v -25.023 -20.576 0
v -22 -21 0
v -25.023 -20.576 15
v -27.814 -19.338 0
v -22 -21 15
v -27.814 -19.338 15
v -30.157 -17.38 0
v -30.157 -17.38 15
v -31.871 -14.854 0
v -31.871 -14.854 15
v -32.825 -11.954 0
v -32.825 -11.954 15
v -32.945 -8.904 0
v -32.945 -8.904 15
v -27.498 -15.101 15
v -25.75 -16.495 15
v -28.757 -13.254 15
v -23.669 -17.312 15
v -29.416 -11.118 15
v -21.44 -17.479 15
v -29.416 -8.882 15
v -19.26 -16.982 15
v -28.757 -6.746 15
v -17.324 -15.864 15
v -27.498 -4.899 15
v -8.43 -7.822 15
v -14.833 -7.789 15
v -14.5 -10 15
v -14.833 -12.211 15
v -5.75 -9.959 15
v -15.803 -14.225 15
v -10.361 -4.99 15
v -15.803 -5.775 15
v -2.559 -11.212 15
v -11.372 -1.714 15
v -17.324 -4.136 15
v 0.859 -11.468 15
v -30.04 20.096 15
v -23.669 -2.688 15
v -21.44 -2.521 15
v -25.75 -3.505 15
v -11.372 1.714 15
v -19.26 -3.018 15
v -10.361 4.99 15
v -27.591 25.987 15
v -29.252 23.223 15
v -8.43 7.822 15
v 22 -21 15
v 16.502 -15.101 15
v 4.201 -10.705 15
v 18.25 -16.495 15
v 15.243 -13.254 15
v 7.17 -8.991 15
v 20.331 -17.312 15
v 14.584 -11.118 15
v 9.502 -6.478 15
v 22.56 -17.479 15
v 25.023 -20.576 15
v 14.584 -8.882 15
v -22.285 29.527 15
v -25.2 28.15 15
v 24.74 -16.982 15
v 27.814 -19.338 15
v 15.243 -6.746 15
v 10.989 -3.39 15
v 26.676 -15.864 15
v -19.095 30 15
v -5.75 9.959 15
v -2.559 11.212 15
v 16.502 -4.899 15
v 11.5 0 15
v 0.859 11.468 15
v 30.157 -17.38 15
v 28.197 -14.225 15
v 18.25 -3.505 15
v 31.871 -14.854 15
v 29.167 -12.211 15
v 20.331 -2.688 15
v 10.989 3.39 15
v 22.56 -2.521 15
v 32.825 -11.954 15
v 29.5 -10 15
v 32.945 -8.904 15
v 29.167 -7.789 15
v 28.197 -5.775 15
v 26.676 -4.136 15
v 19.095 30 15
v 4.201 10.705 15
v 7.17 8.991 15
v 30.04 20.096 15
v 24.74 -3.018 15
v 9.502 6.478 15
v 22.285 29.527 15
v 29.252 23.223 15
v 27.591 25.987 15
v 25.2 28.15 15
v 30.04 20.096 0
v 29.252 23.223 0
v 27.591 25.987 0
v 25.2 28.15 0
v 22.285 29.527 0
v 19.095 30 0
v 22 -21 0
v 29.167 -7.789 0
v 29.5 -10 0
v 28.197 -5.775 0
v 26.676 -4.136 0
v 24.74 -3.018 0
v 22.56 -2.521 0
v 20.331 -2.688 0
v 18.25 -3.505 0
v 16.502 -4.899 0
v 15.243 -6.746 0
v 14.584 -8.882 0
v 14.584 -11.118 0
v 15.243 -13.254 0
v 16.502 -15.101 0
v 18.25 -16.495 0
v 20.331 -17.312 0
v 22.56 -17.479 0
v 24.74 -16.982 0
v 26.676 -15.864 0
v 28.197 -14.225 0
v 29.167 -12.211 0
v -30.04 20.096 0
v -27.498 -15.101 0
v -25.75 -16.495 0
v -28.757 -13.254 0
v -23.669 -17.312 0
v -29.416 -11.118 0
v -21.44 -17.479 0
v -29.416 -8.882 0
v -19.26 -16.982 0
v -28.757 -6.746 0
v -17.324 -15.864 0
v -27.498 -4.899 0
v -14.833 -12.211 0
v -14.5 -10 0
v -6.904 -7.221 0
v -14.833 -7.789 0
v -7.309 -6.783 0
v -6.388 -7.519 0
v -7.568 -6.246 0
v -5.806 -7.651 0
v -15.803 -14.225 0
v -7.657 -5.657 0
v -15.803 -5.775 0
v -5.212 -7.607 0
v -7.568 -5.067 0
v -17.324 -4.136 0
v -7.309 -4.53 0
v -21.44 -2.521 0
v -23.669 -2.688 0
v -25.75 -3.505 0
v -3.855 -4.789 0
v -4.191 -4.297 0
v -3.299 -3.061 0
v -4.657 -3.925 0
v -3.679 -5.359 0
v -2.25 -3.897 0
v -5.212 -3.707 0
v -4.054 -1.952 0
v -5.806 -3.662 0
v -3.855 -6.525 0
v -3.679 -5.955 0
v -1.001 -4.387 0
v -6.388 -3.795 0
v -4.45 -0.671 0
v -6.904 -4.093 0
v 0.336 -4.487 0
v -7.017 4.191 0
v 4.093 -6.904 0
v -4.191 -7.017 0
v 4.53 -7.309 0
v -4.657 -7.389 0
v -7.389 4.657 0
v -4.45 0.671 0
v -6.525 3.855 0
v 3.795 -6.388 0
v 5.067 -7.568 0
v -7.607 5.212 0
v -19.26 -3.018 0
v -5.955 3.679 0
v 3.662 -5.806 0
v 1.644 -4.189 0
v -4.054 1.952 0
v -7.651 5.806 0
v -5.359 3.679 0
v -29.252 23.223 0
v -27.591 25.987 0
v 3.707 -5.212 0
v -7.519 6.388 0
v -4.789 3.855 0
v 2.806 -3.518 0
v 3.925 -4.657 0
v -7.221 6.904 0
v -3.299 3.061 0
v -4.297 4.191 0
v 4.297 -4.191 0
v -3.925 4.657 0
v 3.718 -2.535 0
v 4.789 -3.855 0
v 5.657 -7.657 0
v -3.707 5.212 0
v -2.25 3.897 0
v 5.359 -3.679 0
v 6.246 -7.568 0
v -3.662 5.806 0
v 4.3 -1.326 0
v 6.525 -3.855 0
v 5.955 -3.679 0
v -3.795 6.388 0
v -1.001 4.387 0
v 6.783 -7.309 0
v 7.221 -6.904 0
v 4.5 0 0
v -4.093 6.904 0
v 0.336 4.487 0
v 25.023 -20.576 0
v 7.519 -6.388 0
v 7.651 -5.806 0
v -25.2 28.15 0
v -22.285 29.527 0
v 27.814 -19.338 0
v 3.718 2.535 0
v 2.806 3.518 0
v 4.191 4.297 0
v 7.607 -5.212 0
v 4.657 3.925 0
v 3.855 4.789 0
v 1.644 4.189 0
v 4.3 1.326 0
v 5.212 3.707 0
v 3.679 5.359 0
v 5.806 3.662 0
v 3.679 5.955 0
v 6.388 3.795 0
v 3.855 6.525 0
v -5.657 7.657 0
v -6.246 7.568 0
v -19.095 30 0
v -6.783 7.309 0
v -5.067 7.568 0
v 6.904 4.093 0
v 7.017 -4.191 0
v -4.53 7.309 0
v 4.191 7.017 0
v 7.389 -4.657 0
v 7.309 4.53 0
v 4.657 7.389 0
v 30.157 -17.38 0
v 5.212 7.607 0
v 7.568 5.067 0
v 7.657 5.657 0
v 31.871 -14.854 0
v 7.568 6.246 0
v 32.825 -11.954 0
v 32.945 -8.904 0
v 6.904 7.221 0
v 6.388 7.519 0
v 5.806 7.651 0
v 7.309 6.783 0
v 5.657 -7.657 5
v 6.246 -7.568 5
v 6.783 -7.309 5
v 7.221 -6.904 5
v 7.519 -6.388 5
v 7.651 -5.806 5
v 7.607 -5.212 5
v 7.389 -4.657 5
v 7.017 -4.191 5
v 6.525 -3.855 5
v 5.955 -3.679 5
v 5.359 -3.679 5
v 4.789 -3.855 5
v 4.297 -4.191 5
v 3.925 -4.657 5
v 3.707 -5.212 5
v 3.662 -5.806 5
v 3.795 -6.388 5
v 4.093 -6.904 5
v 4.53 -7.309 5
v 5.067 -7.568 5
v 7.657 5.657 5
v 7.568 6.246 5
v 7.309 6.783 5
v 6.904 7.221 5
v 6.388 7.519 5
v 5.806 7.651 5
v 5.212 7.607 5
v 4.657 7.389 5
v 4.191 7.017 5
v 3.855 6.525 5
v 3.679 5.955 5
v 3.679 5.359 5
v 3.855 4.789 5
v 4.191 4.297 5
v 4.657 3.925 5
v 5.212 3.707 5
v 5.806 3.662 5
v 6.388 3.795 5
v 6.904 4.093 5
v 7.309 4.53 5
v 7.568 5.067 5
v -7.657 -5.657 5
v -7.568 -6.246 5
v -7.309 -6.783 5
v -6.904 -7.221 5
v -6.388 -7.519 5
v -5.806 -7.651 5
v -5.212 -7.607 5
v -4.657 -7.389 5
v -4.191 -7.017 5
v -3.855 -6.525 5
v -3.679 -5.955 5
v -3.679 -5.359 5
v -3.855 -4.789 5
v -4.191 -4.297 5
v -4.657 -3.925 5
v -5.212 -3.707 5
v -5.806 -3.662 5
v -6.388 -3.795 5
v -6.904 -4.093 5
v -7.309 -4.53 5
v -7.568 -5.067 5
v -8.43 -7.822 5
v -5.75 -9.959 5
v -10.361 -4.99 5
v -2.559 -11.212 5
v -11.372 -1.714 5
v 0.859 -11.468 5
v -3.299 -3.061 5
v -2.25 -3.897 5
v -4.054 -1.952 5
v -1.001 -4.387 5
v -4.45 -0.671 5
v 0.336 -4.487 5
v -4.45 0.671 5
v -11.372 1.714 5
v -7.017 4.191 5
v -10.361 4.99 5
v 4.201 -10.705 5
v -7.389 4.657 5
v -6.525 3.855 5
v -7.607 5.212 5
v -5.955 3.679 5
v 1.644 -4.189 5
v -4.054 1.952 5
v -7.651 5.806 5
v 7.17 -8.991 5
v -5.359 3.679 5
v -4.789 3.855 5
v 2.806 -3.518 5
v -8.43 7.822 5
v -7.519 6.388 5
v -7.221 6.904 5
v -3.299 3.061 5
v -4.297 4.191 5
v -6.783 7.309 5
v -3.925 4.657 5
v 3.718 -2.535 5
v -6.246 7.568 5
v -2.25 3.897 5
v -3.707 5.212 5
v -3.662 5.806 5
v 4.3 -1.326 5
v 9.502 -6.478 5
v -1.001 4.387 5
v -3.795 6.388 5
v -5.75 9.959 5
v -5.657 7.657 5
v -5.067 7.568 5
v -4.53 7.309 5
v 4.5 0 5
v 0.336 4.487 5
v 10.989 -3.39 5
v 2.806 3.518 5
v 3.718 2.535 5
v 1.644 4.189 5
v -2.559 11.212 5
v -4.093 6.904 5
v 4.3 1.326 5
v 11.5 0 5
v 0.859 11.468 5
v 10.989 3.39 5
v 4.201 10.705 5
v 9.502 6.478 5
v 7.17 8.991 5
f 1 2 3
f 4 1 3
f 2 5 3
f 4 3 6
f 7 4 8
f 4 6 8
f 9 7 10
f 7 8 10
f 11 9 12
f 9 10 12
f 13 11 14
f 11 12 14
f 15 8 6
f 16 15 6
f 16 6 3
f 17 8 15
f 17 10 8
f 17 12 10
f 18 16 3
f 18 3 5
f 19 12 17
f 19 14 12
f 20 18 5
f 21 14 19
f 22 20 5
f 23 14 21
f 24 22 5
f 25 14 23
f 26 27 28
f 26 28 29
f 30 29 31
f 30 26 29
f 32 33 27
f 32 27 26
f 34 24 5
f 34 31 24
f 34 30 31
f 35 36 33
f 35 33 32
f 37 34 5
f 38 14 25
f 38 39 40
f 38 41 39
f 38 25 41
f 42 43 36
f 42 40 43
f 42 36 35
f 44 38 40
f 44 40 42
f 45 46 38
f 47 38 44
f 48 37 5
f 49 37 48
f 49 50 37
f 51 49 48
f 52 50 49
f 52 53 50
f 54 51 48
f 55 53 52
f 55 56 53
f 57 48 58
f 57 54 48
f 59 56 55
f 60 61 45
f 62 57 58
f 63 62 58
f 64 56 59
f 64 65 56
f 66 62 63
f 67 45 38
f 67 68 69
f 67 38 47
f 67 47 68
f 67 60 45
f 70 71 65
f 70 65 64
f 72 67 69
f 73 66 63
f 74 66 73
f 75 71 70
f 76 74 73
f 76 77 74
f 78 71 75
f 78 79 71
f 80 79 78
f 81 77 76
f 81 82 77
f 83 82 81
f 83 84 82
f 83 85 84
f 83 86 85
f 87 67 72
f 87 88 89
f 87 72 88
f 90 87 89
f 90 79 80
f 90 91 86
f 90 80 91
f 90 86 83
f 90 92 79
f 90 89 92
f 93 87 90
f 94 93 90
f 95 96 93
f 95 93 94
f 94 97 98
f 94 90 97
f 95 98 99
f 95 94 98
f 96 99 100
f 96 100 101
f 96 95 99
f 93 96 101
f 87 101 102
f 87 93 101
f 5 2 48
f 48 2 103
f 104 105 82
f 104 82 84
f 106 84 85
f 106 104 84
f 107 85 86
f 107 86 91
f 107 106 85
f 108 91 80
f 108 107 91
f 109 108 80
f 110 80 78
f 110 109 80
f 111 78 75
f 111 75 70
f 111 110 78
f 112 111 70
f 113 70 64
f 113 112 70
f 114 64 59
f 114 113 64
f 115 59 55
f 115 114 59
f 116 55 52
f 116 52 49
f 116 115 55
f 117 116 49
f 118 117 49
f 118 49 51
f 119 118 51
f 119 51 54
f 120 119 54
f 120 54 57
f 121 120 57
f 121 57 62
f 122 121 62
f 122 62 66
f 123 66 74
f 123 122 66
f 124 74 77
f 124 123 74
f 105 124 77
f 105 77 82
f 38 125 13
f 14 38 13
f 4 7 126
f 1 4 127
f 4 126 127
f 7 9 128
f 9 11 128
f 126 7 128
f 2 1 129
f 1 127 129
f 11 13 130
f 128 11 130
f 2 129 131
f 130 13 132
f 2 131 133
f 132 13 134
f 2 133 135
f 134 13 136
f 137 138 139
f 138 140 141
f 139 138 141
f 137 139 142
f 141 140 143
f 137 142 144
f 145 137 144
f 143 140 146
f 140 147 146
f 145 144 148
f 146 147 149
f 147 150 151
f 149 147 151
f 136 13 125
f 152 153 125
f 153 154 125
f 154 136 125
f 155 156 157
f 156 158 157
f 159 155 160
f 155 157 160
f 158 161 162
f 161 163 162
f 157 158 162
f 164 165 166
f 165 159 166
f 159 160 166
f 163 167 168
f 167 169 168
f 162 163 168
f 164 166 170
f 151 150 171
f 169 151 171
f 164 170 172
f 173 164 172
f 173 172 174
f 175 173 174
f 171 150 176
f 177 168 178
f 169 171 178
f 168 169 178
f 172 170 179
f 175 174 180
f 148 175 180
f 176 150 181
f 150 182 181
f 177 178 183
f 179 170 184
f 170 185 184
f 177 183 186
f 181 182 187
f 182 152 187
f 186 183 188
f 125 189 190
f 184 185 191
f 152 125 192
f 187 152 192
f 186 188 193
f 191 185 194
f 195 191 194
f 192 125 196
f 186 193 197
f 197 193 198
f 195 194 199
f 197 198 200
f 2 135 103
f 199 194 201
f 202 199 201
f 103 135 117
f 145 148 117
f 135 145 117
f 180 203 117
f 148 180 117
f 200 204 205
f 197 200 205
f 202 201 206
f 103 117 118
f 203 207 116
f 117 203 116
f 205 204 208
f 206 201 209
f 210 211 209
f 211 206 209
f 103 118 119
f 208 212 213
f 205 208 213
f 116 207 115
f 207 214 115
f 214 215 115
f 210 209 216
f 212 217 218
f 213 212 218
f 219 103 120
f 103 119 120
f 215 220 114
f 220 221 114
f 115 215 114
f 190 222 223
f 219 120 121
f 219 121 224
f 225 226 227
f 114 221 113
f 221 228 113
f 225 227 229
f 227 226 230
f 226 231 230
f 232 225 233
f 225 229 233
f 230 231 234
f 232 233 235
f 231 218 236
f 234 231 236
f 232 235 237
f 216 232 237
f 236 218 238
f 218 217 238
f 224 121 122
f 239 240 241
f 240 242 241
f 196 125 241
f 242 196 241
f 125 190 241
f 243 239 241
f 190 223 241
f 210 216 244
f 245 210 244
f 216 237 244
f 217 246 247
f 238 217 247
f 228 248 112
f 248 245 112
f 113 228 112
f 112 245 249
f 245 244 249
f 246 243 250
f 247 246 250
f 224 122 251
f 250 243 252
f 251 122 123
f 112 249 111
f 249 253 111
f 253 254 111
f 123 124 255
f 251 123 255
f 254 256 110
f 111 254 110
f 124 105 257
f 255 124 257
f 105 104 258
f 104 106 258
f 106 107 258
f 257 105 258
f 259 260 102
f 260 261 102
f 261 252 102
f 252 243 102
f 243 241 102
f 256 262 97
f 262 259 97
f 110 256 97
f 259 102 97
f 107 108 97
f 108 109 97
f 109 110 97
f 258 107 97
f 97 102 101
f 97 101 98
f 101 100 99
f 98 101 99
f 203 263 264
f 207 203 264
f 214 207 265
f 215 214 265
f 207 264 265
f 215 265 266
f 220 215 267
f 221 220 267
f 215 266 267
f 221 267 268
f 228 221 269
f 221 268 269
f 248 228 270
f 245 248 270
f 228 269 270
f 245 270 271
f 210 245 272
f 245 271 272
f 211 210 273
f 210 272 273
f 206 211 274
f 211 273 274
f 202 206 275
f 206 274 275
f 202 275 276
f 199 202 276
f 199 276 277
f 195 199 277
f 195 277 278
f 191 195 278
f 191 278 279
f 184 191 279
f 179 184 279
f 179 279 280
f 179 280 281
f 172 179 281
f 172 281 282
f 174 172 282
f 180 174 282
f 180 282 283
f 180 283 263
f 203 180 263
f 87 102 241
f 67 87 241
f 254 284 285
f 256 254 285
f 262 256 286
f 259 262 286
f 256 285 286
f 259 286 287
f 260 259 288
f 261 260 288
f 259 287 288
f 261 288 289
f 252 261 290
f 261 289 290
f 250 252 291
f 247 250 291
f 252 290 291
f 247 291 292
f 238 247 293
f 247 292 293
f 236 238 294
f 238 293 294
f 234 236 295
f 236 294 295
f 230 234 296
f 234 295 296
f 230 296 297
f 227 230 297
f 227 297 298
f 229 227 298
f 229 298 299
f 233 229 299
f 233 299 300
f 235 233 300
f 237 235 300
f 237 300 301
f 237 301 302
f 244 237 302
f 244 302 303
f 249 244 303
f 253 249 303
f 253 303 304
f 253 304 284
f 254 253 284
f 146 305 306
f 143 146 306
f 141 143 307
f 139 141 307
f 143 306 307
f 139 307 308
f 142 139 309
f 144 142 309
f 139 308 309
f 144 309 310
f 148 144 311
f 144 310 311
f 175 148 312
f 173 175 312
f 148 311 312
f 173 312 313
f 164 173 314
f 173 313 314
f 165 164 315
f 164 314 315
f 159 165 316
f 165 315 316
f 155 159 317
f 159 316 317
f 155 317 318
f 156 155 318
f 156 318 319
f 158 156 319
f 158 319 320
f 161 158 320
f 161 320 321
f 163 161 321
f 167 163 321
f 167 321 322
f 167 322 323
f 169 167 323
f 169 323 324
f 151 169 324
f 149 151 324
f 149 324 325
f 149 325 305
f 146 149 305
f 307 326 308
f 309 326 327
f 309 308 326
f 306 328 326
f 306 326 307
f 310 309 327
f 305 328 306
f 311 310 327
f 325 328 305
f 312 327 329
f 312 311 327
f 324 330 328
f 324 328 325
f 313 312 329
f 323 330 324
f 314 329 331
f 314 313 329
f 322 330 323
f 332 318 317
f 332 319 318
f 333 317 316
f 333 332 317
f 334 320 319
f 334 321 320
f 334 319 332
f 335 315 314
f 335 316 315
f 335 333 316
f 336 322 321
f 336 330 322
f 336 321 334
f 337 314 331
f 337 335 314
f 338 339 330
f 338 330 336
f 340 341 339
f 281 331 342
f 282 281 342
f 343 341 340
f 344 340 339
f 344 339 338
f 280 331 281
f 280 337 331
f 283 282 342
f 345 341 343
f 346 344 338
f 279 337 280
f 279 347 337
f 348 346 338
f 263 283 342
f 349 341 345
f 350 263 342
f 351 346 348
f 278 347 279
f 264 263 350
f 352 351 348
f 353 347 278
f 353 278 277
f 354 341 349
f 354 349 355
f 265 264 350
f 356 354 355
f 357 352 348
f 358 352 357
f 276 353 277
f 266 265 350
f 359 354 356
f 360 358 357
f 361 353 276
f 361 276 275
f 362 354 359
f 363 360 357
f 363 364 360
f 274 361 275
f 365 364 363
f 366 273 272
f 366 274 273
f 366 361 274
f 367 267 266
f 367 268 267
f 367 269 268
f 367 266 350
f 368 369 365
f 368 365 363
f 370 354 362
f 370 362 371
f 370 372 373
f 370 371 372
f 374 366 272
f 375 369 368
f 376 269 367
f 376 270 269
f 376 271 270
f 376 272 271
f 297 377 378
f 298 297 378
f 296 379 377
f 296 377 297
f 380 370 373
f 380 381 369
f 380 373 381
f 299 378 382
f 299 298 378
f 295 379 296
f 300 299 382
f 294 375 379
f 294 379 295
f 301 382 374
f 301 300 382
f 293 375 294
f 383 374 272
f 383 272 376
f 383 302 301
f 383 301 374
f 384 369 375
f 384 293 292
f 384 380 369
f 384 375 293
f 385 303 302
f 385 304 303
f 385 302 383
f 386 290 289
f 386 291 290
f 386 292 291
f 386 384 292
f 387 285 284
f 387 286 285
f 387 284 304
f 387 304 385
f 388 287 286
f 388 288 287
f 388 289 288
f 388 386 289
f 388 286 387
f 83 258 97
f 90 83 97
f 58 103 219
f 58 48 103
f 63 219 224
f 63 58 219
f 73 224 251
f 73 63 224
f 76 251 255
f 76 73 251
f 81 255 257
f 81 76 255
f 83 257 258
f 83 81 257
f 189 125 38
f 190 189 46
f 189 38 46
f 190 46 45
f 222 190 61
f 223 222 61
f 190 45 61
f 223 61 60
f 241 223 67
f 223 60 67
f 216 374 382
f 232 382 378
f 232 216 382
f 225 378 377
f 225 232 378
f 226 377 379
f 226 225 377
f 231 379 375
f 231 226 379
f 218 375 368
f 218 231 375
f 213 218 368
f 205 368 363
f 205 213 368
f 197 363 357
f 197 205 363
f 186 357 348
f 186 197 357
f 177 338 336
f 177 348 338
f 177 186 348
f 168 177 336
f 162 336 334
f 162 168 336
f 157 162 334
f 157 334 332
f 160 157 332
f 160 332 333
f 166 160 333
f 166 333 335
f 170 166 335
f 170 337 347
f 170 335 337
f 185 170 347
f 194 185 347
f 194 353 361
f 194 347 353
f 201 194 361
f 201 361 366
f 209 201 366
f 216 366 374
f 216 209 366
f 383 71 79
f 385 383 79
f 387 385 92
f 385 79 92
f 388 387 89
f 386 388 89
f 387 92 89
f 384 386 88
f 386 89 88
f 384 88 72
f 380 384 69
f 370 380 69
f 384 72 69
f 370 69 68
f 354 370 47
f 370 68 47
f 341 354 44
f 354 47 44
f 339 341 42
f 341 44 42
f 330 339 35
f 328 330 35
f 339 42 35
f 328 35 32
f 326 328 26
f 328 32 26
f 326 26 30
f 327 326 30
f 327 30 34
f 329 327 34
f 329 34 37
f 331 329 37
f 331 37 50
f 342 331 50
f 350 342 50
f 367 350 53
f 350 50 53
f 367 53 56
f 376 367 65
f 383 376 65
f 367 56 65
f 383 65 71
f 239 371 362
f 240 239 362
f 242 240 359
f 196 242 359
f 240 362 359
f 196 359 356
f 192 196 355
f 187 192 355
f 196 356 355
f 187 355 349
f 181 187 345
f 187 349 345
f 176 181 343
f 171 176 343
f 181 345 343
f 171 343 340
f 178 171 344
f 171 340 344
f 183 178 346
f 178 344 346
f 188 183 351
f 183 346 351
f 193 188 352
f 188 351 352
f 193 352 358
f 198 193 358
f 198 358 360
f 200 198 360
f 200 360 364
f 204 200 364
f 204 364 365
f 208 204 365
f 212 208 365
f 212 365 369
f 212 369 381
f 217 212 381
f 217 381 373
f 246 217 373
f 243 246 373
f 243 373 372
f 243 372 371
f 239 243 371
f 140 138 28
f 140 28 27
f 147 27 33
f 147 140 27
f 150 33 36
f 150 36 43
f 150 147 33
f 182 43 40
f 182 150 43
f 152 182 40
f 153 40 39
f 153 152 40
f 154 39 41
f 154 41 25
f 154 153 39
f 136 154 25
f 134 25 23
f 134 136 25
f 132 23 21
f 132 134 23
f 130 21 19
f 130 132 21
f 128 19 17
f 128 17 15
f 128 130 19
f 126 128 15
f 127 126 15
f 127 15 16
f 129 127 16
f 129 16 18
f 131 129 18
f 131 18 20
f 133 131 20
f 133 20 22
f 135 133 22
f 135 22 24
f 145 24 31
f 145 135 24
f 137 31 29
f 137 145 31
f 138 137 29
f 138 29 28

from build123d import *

# Parameters (mm, degrees)
CROQUIS2_R                   = 7.5
CROQUIS2_R_2                 = 4.5
SALIENTE_EXTRUIR1_DEPTH      = 15
REDONDEO2_R                  = 11
CROQUIS4_R                   = 11.5
CORTAR_EXTRUIR1_DEPTH        = 10
TALADRO_DE_MARGEN_PARA_M31_D = 4
MATRIZC1_COUNT               = 4


with BuildPart() as part:
    # Croquis2 → Saliente-Extruir1 (new body)
    with BuildSketch(Plane.XY):
        Polygon((-34.156880773, -21), (34.156880773, -21), (29.048373678, 30), (-29.048373678, 30), align=None)
        with Locations((22, -10)):
            Circle(CROQUIS2_R, mode=Mode.SUBTRACT)
        with Locations((-22, -10)):
            Circle(CROQUIS2_R, mode=Mode.SUBTRACT)
        Circle(CROQUIS2_R_2, mode=Mode.SUBTRACT)
    extrude(amount=SALIENTE_EXTRUIR1_DEPTH)

    # Redondeo2
    redondeo2_edges = [part.edges().sort_by_distance(p)[0] for p in [
        (34.156880773, -21, 7.5),
        (-34.156880773, -21, 7.5),
        (-29.048373678, 30, 7.5),
        (29.048373678, 30, 7.5),
    ]]
    fillet(redondeo2_edges, radius=REDONDEO2_R)

    # Croquis4 → Cortar-Extruir1 (cut)
    with BuildSketch(Plane.XY.offset(15)):
        Circle(CROQUIS4_R)
    extrude(amount=-CORTAR_EXTRUIR1_DEPTH, mode=Mode.SUBTRACT)

    # Taladro de margen para M31 (through all)
    with Locations(Plane(origin=(0, 0, 0), x_dir=(-1, 0, 0), z_dir=(0, 0, -1))):
        with Locations((-5.656854249, 5.656854249)):
            taladro_de_margen_para_m31 = Hole(TALADRO_DE_MARGEN_PARA_M31_D / 2)

    # MatrizC1: Taladro de margen para M31 ×4 about axis
    matrizc1_axis = Axis((0, 0, 0), (0, 0, 1))
    for i in range(1, MATRIZC1_COUNT):
        add(taladro_de_margen_para_m31.rotate(matrizc1_axis, i * 360 / MATRIZC1_COUNT), mode=Mode.SUBTRACT)


solid = part.part
